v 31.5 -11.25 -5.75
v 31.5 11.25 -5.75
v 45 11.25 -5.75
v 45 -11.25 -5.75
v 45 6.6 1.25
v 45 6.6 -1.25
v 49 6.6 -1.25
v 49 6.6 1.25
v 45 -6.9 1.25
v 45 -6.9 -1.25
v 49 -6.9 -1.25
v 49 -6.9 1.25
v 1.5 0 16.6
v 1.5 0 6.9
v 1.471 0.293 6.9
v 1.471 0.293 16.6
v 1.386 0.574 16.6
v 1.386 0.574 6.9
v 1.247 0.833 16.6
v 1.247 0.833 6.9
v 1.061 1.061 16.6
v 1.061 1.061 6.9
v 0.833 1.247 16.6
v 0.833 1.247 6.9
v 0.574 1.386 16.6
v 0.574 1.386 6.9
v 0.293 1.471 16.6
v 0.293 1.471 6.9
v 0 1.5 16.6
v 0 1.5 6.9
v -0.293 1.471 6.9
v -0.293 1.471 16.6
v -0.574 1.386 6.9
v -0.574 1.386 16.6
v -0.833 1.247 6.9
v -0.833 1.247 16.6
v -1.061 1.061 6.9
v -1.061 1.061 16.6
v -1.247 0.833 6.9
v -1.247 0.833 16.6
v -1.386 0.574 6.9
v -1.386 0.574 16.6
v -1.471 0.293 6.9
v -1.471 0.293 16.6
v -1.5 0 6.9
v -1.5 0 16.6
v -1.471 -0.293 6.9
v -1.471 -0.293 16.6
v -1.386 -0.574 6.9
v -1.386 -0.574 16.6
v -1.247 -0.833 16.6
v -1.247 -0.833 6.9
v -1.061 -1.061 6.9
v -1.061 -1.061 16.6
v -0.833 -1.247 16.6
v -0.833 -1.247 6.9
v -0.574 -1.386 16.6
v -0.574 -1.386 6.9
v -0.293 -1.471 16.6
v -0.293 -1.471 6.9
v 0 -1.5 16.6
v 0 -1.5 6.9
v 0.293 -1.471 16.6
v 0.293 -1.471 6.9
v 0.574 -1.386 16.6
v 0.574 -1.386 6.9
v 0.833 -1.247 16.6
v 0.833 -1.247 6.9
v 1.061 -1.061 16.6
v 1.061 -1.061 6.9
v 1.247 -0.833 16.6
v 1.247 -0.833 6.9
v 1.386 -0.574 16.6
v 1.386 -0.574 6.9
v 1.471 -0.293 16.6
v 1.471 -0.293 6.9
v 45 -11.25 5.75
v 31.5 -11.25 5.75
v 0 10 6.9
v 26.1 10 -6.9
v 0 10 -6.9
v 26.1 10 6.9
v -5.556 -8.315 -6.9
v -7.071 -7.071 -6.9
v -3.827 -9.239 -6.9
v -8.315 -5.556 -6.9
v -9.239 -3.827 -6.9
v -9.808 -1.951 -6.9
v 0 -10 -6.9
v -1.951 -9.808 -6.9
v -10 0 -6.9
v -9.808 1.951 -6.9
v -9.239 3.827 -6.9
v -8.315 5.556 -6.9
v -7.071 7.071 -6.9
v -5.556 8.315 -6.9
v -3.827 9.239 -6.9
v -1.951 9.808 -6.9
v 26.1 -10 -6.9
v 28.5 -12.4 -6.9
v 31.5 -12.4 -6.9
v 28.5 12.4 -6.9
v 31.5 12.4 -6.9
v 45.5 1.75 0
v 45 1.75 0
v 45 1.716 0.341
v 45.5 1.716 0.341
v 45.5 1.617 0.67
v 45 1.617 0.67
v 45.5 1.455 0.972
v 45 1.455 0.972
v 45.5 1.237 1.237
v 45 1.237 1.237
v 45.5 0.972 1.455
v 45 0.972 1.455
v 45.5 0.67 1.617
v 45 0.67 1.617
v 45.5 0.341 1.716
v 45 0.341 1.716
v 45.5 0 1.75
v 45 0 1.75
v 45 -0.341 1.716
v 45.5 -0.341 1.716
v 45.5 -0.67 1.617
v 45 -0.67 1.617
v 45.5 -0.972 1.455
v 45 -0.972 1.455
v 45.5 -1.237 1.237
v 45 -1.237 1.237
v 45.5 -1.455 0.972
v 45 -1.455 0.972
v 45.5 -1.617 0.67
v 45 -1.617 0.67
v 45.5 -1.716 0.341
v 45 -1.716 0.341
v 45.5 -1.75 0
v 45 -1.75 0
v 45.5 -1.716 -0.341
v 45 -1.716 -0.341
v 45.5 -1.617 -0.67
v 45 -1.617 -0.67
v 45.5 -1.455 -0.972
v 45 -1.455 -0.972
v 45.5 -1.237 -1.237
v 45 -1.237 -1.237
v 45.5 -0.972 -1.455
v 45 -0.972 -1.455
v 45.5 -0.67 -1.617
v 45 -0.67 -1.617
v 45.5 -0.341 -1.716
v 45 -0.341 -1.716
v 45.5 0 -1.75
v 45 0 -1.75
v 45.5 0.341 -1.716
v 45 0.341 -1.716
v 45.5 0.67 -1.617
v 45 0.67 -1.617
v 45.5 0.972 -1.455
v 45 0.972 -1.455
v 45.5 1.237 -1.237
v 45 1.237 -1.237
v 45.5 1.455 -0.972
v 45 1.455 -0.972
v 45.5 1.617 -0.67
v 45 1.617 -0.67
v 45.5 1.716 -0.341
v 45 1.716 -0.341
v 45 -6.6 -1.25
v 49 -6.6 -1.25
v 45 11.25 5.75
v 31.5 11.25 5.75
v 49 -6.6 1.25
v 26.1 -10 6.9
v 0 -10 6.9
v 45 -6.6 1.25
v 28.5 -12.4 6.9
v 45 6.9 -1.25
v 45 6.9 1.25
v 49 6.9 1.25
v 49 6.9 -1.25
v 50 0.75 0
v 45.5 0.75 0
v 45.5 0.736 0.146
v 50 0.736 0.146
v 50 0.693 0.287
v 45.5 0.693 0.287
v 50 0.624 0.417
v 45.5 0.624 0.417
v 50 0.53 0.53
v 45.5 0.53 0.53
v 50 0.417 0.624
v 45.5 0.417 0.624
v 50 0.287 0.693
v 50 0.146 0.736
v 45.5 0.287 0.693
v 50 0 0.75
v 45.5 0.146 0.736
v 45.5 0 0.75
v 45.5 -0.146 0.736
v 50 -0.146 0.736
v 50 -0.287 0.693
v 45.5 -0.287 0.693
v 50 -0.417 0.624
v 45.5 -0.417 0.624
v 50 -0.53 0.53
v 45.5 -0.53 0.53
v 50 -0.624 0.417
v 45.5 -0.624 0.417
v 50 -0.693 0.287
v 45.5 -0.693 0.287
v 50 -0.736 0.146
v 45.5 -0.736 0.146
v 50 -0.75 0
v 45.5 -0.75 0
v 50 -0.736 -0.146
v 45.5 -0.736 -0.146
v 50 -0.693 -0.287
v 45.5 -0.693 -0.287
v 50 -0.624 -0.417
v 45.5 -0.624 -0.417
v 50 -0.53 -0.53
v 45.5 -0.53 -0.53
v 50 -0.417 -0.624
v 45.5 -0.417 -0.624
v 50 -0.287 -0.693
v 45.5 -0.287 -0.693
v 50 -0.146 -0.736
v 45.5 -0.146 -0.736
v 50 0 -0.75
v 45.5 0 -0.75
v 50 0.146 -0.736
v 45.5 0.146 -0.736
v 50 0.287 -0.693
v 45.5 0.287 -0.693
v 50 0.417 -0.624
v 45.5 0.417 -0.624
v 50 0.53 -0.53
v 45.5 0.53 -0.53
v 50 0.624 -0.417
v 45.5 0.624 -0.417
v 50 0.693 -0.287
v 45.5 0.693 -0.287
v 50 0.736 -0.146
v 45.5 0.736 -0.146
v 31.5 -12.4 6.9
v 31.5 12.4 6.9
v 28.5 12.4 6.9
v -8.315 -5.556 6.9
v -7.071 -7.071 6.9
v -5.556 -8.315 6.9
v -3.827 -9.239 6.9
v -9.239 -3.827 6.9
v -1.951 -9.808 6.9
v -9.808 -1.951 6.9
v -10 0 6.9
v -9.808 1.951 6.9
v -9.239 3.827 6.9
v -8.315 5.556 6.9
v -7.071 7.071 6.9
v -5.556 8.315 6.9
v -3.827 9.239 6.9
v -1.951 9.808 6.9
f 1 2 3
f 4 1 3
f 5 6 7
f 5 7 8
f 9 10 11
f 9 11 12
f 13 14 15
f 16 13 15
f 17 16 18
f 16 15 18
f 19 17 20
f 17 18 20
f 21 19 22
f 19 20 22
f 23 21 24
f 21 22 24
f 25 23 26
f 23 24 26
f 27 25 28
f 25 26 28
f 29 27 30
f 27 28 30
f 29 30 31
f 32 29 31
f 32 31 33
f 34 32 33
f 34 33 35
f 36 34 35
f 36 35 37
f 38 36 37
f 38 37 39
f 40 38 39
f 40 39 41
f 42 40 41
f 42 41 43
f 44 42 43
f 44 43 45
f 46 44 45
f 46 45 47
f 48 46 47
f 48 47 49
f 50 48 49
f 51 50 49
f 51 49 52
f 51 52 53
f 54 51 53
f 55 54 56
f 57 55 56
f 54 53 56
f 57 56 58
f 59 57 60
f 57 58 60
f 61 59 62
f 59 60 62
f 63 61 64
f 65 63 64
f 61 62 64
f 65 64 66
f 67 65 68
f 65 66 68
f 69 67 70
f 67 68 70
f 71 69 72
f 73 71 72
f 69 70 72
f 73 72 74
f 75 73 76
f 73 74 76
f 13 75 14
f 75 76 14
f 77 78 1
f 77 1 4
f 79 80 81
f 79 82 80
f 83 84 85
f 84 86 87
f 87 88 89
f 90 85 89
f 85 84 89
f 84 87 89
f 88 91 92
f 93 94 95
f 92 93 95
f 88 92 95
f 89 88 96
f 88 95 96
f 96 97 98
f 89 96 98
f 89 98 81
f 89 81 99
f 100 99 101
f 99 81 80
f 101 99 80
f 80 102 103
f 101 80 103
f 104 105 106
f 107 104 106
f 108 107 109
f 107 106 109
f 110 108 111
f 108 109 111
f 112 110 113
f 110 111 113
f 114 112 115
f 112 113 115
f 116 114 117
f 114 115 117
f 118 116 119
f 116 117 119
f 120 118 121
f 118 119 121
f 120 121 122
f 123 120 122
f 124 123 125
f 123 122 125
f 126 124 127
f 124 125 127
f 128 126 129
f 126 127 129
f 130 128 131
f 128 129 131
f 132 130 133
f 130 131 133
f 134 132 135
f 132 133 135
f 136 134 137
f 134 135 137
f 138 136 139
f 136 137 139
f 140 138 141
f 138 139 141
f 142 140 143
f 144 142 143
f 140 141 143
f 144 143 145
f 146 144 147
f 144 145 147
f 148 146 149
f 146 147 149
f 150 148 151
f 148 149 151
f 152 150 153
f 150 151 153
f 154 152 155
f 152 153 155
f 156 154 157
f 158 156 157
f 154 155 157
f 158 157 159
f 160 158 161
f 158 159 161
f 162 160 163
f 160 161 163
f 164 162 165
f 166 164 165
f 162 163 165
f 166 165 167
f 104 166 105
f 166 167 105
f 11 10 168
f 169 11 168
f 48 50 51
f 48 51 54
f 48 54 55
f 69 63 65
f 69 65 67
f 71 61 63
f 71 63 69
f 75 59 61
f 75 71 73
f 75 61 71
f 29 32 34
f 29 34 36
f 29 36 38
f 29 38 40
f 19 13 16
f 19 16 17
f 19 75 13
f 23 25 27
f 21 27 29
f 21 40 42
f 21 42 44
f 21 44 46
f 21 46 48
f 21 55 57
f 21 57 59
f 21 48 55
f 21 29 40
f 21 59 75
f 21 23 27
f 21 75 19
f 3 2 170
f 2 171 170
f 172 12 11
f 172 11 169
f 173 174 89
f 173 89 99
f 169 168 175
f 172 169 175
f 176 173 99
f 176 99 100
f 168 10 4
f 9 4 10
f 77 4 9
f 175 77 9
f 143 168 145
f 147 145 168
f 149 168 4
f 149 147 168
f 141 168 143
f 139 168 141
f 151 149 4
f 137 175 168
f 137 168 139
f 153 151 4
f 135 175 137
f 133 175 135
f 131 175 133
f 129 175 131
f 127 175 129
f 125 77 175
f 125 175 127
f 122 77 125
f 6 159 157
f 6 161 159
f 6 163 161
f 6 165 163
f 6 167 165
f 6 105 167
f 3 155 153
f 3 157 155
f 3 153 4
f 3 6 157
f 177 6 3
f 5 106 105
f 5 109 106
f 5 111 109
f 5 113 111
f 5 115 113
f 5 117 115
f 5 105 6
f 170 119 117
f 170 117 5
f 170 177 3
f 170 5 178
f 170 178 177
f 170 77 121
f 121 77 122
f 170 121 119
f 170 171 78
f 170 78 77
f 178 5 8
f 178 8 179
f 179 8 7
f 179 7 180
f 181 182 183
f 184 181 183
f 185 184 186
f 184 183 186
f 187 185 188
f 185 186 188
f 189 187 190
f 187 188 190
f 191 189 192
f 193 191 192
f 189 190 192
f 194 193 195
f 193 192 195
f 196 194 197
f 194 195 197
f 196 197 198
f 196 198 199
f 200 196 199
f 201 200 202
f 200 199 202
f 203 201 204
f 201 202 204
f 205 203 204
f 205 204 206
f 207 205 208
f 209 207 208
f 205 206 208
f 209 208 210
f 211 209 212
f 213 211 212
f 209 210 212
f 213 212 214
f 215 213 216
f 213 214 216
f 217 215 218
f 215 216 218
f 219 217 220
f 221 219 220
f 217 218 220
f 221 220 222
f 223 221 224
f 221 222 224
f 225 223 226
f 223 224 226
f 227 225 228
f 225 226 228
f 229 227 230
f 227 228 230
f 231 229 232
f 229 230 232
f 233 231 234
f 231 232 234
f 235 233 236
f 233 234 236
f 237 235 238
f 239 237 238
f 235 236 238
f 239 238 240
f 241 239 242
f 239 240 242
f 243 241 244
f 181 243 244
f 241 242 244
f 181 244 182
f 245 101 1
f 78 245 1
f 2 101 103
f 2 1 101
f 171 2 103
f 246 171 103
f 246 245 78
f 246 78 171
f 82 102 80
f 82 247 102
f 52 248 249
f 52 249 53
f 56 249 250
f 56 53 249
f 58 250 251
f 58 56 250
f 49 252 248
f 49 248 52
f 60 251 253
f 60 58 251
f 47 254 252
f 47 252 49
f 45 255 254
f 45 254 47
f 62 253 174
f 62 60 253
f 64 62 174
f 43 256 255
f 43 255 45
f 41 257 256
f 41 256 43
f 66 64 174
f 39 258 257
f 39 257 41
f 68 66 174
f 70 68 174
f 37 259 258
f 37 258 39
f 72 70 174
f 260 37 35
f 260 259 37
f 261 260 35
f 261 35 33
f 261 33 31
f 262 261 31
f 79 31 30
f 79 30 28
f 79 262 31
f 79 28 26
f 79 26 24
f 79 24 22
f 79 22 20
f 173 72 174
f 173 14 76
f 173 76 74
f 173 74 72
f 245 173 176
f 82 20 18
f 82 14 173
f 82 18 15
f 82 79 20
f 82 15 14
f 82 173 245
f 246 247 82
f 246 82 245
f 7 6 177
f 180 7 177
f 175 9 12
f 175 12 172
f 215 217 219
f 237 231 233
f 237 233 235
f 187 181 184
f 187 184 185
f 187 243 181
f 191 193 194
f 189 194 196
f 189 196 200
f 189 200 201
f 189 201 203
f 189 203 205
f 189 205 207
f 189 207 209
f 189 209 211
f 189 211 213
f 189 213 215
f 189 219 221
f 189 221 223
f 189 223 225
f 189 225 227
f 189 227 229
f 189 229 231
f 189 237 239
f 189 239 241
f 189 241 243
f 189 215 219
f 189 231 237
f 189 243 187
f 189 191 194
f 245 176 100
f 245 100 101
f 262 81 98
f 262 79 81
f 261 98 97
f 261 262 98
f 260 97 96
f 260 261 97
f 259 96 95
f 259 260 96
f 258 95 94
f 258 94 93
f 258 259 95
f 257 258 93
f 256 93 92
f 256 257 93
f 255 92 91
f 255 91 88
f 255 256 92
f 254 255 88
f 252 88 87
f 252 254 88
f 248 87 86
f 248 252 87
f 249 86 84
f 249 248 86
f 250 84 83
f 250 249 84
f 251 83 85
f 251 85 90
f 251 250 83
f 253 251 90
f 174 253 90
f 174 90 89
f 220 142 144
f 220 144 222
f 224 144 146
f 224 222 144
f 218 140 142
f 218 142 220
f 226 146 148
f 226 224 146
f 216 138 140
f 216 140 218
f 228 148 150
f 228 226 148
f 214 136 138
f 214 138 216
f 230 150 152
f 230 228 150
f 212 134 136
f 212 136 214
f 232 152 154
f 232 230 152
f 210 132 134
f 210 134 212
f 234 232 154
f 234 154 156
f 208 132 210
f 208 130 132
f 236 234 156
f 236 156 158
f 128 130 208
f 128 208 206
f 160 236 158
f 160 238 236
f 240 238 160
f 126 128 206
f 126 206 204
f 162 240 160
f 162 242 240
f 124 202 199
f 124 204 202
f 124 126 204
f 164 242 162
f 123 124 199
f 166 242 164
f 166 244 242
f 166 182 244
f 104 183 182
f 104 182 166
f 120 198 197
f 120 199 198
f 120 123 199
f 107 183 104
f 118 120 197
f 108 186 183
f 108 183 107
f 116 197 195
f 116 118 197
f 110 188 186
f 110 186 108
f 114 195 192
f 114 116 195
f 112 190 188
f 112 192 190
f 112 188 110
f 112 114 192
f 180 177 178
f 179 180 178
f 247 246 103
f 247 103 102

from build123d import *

# Parameters (mm, degrees)
F1_DEPTH  = 6.9
F2_R      = 1.5
F3_DEPTH  = 16.6
F4_W      = 13.5
F4_H      = 22.5
F5_DEPTH  = 5.75
F6_R      = 1.75
F7_DEPTH  = 0.5
F8_R      = 0.75
F9_DEPTH  = 4.5
F10_W     = 0.3
F10_H     = 2.5
F11_DEPTH = 4


with BuildPart() as f1:
    # F0 (on Top) → F1 (new body, symmetric)
    with BuildSketch(Plane.XY):
        with BuildLine():
            ThreePointArc((0, -10), (7.071068, -7.071068), (10, 0))
            ThreePointArc((10, 0), (7.071068, 7.071068), (0, 10))
            ThreePointArc((0, 10), (-10, 0), (0, -10))
        make_face()
        with BuildLine():
            ThreePointArc((0, 10), (7.071068, 7.071068), (10, 0))
            ThreePointArc((10, 0), (7.071068, -7.071068), (0, -10))
            Line((0, -10), (26.1, -10))
            Line((26.1, -10), (28.5, -12.4))
            Line((28.5, -12.4), (31.5, -12.4))
            Line((31.5, -12.4), (31.5, 0))
            Line((31.5, 0), (31.5, 12.4))
            Line((31.5, 12.4), (28.5, 12.4))
            Line((28.5, 12.4), (26.1, 10))
            Line((26.1, 10), (0, 10))
        make_face()
    extrude(amount=F1_DEPTH, both=True)

    # F2 (on Top) → F3 (join)
    with BuildSketch(Plane.XY):
        Circle(F2_R)
    extrude(amount=F3_DEPTH)

    # F4 (on Top) → F5 (join, symmetric)
    with BuildSketch(Plane.XY):
        with Locations((38.25, 0)):
            Rectangle(F4_W, F4_H)
    extrude(amount=F5_DEPTH, both=True)

    # F6 (on face) → F7 (join)
    with BuildSketch(Plane.YZ.offset(45)):
        Circle(F6_R)
    extrude(amount=F7_DEPTH)

    # F8 (on face) → F9 (join)
    with BuildSketch(Plane.YZ.offset(45.5)):
        Circle(F8_R)
    extrude(amount=F9_DEPTH)

    # F10 (on face) → F11 (join)
    with BuildSketch(Plane.YZ.offset(45)):
        with Locations((-6.75, 0)):
            Rectangle(F10_W, F10_H)
        with Locations((6.75, 0)):
            Rectangle(F10_W, F10_H)
    extrude(amount=F11_DEPTH)


solid = f1.part
